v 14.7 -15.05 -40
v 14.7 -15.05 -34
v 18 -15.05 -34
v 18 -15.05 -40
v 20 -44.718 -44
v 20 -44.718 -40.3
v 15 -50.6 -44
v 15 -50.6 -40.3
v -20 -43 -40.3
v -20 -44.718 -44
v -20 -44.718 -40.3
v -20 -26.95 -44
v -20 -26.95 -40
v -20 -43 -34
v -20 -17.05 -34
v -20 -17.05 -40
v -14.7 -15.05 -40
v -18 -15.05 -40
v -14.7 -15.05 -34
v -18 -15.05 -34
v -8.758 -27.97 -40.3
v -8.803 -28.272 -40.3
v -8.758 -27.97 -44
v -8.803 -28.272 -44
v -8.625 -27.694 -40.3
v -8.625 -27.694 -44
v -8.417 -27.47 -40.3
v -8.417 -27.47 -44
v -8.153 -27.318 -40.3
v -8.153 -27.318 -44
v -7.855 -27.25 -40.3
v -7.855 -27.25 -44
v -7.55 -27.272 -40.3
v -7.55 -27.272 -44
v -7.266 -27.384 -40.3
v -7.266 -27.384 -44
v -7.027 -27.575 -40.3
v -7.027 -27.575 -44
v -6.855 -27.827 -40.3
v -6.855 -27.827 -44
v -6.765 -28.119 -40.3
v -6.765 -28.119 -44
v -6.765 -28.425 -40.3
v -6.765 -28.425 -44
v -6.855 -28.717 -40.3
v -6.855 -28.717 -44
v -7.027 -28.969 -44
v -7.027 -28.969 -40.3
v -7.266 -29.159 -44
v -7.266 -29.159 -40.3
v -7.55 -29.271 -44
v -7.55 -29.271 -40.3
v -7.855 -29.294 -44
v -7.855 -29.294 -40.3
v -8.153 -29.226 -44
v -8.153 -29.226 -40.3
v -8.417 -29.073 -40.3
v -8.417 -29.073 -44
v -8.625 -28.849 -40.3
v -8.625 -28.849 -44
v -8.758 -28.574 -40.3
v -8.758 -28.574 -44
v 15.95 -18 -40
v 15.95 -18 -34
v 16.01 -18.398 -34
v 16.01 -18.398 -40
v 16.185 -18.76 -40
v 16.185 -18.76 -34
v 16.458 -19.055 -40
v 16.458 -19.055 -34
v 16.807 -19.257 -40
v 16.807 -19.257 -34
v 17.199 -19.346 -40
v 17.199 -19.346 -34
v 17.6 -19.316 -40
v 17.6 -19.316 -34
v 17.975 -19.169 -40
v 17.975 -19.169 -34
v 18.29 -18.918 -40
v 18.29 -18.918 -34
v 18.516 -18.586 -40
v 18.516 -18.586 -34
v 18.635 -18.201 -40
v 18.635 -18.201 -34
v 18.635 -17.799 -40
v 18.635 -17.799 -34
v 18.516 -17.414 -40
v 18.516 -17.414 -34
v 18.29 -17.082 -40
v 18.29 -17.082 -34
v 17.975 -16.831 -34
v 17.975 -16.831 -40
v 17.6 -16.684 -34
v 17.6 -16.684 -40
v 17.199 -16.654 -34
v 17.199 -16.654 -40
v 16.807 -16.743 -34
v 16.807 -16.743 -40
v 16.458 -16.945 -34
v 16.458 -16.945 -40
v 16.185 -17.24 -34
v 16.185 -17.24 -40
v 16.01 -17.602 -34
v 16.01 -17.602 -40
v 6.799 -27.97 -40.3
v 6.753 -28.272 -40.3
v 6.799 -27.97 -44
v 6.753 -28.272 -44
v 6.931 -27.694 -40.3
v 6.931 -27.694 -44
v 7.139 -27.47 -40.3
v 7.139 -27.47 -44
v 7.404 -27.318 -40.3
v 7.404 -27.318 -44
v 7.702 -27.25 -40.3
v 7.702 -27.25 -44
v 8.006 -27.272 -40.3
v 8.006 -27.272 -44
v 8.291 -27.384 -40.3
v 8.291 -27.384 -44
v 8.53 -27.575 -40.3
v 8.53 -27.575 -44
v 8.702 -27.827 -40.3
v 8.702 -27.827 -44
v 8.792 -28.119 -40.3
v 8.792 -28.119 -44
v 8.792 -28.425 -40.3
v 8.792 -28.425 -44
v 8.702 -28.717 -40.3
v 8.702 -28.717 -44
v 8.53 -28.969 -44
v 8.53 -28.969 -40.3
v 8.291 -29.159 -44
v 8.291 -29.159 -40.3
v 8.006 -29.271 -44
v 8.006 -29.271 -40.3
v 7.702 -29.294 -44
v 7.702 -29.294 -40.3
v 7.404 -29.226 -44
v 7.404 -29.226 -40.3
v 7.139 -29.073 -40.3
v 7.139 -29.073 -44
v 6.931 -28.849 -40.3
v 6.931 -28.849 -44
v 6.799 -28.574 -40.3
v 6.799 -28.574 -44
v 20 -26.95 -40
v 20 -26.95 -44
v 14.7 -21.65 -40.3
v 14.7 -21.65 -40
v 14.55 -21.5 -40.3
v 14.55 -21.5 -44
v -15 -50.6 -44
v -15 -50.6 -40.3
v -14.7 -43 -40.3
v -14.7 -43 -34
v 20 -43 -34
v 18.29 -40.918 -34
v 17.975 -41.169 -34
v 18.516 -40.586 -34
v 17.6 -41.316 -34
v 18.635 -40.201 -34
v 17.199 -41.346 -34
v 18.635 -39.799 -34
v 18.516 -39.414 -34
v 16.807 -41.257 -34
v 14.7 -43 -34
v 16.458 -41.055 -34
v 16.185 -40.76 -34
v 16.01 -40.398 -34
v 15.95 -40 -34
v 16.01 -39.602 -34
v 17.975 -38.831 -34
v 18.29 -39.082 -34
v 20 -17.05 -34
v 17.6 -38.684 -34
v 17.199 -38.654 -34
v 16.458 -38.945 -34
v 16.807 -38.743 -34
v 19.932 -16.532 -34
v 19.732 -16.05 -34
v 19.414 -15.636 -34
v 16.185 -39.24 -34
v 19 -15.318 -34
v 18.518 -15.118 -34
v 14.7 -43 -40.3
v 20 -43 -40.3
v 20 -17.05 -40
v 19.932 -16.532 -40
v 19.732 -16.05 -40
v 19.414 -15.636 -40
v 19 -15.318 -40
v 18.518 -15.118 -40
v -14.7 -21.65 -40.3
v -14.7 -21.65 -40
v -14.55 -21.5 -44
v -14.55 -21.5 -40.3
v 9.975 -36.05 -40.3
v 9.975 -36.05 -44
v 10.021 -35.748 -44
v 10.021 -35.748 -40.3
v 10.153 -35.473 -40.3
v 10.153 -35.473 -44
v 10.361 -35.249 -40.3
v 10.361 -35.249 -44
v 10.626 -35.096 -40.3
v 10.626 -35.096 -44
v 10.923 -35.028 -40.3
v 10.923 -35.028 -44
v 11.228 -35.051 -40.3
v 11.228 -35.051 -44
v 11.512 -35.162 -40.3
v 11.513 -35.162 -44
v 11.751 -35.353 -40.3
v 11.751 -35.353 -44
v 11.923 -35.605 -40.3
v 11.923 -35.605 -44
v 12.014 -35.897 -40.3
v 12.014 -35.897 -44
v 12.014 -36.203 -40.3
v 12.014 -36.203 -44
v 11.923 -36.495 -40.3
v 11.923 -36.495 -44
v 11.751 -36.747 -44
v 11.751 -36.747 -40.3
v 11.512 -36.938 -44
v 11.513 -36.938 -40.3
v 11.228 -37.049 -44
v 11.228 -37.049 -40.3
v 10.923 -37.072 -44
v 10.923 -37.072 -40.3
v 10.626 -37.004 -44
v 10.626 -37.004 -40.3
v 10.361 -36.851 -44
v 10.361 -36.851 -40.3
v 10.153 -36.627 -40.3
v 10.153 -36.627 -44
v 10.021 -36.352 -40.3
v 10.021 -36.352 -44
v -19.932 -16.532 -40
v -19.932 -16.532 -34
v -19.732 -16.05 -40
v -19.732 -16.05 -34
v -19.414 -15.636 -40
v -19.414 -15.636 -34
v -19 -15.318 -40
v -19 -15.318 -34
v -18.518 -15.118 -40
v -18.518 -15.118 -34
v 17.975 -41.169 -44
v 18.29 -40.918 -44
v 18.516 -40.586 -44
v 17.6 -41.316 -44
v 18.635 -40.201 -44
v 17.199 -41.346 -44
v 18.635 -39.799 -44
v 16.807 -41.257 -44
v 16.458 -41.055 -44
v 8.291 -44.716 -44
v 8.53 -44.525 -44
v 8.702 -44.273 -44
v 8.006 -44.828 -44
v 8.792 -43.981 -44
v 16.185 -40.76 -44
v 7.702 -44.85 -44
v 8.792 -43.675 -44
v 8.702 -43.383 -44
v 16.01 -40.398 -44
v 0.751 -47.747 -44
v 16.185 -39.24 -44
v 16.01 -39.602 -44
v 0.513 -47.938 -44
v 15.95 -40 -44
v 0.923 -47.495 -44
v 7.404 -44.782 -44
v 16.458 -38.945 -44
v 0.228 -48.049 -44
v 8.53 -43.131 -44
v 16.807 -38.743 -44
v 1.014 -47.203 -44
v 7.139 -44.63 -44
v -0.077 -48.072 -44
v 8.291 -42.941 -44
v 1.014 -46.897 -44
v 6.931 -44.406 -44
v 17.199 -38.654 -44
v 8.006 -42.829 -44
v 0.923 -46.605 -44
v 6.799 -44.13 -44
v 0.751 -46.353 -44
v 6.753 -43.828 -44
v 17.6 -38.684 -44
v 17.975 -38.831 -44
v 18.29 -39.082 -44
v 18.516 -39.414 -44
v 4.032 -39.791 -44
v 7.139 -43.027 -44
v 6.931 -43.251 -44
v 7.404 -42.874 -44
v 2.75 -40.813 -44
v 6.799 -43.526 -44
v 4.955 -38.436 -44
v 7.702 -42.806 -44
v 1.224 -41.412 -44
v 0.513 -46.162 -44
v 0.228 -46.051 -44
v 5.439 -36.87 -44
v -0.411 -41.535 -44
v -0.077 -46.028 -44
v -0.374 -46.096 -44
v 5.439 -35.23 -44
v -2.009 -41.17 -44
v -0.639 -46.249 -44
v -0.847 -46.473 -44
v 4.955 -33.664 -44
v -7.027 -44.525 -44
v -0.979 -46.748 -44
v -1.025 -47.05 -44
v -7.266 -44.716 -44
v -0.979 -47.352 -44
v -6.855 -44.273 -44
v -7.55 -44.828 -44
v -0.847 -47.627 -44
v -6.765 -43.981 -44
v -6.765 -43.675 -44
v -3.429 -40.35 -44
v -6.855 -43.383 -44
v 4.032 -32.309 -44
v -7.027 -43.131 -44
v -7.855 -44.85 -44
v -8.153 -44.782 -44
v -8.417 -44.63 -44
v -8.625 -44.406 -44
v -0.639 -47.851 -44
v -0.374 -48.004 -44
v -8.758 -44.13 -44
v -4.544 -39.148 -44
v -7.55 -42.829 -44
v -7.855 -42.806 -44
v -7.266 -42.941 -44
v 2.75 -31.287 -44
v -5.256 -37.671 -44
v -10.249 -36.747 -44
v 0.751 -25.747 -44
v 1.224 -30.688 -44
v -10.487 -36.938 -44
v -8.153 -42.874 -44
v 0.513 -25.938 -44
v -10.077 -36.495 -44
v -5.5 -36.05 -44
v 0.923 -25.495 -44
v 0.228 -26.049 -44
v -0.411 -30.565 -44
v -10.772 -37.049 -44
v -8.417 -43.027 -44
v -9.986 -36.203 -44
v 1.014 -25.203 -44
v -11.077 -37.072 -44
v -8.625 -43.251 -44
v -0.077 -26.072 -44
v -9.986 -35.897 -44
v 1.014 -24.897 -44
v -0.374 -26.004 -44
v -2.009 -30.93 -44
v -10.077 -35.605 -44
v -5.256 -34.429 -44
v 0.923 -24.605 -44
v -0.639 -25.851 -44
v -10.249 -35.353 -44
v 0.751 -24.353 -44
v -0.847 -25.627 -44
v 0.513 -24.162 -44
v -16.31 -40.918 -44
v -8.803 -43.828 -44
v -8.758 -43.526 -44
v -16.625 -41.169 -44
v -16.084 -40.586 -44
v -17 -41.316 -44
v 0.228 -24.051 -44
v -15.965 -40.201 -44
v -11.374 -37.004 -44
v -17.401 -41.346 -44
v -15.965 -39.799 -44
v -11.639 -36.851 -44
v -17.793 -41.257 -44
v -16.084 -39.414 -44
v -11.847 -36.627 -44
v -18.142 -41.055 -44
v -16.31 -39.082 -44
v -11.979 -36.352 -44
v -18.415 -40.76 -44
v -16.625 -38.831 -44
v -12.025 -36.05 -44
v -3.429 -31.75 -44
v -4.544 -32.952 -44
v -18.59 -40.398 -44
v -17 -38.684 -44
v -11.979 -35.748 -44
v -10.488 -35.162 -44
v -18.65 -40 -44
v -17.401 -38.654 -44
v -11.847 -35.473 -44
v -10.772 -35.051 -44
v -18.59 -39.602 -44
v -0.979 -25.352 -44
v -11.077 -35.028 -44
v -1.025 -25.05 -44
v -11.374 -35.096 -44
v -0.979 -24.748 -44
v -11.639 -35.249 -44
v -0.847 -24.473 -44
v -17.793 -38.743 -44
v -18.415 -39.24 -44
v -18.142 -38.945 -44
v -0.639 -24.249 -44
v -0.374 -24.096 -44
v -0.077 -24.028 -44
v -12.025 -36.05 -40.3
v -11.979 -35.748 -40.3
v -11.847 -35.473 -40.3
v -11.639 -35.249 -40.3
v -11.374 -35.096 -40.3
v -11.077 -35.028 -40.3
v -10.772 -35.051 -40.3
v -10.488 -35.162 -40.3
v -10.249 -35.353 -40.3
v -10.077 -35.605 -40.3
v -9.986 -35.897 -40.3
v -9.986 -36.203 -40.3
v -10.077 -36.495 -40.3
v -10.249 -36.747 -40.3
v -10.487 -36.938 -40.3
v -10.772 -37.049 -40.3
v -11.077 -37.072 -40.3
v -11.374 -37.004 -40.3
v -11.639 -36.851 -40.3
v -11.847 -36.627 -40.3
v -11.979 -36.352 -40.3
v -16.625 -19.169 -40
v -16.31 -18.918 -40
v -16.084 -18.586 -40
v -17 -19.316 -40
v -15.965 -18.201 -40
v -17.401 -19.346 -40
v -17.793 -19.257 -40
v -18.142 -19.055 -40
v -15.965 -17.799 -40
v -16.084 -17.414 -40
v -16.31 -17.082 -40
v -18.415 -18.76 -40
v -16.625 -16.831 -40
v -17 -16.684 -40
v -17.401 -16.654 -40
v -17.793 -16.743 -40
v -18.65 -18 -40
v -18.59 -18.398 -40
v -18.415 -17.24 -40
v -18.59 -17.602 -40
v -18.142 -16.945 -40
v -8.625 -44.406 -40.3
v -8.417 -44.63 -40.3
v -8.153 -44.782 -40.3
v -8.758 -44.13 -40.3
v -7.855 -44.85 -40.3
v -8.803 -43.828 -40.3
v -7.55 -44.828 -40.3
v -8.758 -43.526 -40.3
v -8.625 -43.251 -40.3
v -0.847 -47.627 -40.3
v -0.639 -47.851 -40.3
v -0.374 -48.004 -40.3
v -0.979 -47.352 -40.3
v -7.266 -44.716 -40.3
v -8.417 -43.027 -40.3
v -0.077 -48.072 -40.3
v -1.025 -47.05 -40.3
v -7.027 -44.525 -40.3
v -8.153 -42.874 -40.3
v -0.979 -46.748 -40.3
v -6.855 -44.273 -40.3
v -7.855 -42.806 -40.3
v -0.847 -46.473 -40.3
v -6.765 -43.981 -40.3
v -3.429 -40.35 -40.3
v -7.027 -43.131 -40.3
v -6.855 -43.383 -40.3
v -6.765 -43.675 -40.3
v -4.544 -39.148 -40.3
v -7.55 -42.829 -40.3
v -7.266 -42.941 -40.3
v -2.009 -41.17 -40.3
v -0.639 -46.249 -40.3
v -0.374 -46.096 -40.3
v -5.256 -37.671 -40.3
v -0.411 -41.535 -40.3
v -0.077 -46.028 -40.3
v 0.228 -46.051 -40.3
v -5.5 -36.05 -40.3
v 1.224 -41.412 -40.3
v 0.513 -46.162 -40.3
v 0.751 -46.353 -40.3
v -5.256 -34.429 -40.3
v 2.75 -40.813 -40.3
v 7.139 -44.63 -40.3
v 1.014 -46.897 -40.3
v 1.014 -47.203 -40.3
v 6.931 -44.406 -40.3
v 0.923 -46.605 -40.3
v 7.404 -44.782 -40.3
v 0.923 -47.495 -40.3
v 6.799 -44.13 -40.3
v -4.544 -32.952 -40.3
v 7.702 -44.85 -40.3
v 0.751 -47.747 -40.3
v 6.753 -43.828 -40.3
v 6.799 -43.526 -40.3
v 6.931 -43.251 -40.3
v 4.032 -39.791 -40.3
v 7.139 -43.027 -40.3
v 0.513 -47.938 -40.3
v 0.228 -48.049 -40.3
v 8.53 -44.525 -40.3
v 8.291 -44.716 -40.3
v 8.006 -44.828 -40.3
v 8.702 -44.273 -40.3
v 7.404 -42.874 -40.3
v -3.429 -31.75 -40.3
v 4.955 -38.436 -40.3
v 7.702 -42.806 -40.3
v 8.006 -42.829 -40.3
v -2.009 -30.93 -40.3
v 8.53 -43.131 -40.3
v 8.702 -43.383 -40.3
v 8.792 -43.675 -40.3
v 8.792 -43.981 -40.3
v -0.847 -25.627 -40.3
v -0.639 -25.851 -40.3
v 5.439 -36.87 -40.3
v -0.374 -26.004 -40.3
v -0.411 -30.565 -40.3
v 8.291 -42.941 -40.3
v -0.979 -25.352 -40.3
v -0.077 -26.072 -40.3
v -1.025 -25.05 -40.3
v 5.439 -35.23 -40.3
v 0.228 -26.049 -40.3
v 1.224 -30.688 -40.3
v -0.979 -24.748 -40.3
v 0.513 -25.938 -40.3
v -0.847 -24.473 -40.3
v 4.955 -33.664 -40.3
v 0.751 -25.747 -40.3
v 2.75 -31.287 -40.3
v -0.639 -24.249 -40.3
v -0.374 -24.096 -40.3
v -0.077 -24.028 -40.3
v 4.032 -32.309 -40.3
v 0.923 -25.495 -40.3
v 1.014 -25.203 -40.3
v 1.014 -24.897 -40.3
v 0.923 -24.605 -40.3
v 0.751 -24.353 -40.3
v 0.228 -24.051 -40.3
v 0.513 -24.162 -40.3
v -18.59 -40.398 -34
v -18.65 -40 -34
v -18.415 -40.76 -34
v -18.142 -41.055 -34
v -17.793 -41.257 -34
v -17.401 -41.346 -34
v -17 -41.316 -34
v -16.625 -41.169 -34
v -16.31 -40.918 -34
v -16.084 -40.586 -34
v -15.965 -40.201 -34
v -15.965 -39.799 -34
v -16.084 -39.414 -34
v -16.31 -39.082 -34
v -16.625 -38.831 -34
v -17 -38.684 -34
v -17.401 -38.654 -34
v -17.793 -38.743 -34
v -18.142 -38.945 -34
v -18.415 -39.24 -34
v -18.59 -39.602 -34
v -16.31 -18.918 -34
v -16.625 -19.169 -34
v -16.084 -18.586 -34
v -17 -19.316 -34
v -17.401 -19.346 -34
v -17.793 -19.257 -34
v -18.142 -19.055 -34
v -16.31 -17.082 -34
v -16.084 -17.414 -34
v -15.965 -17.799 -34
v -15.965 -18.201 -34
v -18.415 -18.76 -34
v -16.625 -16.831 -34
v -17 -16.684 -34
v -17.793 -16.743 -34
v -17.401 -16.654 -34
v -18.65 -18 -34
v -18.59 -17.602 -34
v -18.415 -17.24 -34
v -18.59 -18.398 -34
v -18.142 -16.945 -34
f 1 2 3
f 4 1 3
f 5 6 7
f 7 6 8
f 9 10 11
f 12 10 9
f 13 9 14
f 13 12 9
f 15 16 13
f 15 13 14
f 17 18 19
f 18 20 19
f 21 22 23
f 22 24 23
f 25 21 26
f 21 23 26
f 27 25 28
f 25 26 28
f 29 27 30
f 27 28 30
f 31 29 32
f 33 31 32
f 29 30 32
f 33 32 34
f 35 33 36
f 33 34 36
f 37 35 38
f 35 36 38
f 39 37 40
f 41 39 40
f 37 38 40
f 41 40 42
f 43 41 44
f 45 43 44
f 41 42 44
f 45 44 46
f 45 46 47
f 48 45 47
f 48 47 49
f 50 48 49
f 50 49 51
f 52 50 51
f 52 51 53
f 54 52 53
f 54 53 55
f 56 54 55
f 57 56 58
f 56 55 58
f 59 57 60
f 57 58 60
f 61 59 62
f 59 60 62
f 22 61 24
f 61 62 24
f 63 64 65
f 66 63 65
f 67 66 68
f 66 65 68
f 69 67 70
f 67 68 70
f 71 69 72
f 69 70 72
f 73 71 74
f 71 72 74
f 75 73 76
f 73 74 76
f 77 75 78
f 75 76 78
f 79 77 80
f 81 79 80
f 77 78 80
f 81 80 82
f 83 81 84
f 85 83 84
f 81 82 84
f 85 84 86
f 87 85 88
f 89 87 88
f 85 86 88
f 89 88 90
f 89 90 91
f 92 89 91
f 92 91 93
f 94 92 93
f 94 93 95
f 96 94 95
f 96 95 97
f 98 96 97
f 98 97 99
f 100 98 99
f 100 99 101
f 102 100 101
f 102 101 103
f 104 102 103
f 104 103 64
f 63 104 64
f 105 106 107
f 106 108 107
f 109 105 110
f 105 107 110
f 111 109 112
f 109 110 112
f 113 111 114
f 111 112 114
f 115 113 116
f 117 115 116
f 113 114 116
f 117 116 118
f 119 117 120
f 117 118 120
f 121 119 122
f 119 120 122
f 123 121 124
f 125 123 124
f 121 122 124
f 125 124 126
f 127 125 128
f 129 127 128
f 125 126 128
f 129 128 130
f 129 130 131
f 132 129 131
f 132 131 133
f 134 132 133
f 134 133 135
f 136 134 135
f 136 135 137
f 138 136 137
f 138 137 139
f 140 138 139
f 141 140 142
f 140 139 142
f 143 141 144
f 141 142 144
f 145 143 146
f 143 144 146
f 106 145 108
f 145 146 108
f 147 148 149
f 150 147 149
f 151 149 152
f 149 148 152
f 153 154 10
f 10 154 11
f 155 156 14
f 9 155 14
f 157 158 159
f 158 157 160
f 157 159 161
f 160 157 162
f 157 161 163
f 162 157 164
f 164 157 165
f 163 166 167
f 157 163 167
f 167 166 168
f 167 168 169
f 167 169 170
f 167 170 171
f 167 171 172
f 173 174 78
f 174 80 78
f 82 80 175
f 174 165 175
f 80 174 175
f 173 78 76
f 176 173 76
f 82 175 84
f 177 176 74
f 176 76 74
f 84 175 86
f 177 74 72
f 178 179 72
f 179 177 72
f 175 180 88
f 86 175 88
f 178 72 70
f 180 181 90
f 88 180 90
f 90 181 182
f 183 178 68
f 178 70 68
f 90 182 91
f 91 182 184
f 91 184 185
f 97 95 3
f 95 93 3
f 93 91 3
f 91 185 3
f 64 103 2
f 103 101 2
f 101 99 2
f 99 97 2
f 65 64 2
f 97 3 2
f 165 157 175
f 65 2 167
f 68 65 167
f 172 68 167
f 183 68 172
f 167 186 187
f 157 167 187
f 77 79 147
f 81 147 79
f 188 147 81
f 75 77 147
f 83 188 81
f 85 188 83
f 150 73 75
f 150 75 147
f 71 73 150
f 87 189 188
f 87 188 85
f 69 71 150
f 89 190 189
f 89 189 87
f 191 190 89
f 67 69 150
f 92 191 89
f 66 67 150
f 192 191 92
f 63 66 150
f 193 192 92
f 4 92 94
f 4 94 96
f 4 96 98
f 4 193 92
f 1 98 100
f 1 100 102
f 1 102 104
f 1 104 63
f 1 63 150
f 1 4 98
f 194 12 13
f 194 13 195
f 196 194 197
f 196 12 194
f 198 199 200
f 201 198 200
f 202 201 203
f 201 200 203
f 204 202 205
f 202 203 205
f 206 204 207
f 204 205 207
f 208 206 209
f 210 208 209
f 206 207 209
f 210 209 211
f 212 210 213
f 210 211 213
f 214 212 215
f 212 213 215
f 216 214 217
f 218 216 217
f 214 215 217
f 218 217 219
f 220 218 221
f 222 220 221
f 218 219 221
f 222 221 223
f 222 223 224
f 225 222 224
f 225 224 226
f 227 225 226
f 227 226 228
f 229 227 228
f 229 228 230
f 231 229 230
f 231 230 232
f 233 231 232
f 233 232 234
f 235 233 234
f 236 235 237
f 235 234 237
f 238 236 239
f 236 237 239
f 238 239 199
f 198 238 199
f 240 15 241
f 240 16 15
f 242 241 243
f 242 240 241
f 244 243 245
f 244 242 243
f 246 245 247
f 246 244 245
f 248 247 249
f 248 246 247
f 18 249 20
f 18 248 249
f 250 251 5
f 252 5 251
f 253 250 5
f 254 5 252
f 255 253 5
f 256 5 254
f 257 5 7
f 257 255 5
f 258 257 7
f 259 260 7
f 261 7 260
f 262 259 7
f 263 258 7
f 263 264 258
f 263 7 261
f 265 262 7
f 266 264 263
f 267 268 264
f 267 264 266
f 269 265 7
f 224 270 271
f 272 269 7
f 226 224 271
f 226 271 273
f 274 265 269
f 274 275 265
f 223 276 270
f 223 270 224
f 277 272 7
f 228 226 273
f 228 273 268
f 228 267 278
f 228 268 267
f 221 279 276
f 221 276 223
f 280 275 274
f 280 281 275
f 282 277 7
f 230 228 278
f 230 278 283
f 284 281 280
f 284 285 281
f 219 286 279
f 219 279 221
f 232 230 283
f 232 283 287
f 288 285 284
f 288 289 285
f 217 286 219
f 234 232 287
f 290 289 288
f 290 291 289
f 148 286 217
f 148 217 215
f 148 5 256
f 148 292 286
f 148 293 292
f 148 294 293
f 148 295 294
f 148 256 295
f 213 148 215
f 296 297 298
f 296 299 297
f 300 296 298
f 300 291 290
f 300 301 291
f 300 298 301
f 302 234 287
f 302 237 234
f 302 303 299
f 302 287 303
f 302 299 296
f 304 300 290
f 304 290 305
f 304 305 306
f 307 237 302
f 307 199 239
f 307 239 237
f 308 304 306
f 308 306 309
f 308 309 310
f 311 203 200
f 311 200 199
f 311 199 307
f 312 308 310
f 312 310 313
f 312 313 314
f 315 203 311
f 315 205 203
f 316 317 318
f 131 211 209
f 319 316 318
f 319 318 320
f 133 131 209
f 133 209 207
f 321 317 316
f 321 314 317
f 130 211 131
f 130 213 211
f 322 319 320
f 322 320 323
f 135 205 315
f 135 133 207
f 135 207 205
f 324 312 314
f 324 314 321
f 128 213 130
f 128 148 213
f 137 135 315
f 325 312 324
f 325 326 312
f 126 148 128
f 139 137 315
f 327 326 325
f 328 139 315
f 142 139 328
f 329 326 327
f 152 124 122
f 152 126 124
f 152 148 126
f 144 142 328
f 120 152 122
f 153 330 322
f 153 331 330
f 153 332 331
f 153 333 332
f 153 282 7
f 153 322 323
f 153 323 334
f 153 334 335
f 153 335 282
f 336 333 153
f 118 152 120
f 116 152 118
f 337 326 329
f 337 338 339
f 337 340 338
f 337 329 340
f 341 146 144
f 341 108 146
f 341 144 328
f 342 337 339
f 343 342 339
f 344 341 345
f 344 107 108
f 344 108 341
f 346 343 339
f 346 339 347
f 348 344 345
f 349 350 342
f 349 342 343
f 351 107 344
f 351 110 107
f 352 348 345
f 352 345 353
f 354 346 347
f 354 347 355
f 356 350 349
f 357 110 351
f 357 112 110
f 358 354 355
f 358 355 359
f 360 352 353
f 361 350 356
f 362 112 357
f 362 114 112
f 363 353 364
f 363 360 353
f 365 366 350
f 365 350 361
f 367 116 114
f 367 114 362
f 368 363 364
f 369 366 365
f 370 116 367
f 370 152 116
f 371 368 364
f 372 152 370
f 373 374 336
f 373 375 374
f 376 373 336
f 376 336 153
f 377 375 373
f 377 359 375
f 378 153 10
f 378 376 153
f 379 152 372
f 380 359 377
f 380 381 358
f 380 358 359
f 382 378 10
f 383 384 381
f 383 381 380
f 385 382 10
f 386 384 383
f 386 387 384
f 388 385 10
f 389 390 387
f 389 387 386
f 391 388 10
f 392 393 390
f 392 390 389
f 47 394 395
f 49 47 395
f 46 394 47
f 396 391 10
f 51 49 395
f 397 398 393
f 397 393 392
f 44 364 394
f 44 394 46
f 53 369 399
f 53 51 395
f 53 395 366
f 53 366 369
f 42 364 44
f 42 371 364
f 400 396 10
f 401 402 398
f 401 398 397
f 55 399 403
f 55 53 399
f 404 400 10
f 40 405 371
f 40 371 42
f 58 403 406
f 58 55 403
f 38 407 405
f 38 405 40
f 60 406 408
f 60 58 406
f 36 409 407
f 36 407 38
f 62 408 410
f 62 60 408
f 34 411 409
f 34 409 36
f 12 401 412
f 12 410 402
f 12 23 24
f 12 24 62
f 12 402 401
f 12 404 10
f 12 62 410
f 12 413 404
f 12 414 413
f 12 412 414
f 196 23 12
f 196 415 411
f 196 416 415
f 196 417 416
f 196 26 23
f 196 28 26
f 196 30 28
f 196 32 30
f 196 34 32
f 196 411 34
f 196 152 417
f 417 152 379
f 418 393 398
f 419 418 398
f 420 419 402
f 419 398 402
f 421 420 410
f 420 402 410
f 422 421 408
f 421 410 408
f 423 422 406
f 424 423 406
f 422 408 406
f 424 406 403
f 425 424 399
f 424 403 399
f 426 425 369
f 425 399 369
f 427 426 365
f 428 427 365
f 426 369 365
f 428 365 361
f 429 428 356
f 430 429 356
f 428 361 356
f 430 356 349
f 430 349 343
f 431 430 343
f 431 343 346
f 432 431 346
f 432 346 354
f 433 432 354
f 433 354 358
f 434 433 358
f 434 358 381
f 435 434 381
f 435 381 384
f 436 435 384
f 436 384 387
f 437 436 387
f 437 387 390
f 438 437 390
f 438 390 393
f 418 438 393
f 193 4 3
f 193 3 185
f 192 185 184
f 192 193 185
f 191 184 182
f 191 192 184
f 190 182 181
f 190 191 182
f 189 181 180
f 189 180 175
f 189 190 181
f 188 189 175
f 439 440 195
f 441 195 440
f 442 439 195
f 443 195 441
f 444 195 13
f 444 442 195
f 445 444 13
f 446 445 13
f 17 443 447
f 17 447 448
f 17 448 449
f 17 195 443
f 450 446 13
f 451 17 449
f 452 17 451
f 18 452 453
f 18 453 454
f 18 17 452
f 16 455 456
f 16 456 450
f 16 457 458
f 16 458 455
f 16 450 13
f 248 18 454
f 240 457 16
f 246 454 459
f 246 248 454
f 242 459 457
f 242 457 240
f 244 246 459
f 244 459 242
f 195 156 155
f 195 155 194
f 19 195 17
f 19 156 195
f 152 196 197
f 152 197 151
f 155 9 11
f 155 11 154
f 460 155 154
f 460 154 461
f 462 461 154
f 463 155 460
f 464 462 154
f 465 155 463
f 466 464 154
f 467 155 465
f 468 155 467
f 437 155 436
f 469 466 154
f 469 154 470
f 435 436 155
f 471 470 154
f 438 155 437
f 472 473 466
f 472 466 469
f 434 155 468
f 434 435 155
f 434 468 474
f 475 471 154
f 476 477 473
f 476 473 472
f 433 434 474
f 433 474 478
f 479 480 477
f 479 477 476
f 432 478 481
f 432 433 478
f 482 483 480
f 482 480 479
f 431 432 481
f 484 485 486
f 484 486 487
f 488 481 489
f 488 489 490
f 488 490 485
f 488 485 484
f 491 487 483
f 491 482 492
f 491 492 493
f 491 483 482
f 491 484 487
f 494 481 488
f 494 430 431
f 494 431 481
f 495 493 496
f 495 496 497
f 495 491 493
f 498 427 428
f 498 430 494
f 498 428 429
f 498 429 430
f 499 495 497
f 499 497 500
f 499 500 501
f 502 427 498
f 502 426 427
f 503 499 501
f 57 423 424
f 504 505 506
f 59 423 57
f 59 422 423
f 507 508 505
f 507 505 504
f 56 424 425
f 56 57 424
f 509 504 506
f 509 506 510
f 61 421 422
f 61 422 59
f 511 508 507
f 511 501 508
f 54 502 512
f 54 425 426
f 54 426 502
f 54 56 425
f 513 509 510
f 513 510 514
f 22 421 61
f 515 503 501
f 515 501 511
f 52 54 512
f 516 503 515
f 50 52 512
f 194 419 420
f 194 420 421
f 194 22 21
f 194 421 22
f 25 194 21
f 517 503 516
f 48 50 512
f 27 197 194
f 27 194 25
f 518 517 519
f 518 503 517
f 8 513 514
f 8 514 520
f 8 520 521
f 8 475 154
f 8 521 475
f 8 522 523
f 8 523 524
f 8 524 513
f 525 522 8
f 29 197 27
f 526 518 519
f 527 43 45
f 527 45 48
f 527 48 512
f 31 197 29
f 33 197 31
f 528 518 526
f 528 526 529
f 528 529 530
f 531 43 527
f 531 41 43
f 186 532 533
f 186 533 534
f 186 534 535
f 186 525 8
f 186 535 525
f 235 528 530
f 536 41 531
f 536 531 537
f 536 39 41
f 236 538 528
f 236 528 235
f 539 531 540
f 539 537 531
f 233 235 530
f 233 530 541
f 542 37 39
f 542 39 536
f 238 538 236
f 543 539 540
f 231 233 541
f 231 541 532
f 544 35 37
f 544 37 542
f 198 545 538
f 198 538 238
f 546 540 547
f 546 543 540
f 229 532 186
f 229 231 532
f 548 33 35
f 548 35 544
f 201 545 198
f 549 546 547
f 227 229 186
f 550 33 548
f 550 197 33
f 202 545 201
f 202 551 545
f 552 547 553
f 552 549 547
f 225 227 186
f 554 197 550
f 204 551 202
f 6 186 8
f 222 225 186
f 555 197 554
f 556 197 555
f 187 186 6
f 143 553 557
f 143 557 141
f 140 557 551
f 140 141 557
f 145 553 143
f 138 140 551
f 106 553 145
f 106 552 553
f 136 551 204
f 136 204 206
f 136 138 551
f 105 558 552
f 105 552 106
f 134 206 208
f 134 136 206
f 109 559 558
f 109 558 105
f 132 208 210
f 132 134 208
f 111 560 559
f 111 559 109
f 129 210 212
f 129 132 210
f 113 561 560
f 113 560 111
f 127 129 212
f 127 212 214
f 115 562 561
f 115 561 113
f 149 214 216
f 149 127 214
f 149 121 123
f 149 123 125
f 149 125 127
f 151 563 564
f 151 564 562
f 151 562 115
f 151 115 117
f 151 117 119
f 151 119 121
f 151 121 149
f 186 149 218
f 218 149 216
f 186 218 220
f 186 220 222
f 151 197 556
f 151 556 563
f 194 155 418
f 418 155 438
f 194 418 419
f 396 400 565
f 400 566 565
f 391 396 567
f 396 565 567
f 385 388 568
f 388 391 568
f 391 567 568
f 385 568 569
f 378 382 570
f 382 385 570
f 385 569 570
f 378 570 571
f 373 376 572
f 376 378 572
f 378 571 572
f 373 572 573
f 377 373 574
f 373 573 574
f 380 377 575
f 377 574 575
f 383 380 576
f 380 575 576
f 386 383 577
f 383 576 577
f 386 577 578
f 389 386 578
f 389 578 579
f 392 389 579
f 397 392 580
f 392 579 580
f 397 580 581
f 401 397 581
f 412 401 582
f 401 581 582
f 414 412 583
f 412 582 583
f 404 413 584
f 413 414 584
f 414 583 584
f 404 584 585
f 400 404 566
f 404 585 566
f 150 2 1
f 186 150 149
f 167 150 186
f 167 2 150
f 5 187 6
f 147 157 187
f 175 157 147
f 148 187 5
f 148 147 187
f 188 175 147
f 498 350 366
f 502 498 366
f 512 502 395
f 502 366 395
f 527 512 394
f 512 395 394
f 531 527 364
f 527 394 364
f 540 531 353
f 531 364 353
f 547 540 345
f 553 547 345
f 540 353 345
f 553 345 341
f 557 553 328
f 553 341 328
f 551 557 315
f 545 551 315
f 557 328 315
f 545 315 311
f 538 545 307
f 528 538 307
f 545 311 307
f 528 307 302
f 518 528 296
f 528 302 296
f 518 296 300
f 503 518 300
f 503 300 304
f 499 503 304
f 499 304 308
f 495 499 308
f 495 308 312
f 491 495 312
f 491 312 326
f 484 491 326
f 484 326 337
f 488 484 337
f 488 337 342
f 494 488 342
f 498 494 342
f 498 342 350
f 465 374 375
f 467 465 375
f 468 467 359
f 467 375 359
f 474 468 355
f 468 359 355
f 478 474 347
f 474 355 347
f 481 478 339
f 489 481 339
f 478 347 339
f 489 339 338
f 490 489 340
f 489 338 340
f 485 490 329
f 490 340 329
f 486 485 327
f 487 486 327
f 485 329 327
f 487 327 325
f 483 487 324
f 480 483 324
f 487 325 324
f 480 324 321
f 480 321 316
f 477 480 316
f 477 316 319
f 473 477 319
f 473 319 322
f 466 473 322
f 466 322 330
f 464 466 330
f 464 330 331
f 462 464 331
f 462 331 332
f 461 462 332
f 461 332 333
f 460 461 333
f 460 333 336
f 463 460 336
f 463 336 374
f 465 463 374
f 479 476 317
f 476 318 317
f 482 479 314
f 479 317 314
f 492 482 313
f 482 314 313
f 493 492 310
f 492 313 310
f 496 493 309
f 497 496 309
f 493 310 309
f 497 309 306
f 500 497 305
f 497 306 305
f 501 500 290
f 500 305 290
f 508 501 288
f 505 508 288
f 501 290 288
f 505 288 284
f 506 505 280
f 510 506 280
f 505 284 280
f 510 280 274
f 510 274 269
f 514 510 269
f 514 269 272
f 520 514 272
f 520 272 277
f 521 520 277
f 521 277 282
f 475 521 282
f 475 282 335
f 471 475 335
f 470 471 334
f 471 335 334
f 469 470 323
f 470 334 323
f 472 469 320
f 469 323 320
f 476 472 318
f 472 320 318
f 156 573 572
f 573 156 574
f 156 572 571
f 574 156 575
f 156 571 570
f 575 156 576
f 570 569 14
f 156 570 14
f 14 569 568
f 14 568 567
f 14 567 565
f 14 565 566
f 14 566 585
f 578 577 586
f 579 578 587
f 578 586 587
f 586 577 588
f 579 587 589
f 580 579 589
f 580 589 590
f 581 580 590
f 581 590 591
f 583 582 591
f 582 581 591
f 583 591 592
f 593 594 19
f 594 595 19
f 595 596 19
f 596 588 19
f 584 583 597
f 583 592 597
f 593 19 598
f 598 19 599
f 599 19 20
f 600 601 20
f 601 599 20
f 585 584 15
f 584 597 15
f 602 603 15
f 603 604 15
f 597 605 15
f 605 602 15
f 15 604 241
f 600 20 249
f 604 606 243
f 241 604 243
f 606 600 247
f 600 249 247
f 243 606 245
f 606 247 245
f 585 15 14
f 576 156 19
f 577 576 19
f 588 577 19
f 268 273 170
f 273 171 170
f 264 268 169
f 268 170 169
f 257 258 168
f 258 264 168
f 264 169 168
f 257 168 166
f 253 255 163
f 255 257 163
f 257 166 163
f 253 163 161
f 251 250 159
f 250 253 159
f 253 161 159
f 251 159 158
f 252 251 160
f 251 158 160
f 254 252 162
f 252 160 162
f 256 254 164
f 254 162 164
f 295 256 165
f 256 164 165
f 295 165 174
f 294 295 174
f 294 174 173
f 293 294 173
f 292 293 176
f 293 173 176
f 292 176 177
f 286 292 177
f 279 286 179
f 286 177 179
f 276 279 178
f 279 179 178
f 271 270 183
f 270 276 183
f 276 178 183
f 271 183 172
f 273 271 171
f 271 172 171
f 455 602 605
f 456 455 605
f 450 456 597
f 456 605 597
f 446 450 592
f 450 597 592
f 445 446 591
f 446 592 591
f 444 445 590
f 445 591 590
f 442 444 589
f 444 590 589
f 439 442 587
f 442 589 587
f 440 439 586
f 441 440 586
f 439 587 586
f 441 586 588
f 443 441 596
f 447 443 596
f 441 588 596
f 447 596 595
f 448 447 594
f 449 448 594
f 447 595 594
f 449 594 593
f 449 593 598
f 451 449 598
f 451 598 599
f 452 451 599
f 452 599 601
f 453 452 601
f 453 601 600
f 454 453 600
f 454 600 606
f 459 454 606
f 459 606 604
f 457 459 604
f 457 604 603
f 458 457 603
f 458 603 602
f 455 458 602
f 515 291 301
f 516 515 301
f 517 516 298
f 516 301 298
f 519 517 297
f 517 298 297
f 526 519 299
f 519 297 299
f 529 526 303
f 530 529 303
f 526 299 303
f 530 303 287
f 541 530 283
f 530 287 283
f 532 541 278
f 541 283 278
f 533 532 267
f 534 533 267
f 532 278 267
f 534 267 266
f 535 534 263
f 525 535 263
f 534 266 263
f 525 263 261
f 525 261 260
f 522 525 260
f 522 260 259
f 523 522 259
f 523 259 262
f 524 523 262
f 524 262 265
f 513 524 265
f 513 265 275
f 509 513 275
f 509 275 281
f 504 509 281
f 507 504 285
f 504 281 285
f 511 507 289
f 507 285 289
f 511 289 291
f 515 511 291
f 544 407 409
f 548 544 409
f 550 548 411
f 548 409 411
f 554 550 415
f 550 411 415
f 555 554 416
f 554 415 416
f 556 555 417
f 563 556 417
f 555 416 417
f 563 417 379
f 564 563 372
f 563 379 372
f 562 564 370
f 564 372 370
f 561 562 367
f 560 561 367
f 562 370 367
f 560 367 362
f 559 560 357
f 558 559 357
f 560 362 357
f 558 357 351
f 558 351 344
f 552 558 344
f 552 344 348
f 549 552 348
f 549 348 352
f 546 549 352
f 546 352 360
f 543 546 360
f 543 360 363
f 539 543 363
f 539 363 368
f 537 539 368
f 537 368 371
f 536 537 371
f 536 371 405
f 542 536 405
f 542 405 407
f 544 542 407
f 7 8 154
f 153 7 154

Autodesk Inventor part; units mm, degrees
ref_plane "YZ Plane" through (0, 0, 0) normal (1, 0, 0) x (0, 1, 0)
ref_plane "Work Plane1" through (0, 0, -34) normal (0, 0, -1) x (-1, 0, 0)
sketch "Sketch1" plane through (0, 0, -34) normal (0, 0, -1) x (-1, 0, 0)
  line L0 (-15, 14.5) -> (-11.5, 14.5) projected
  line L1 (-15, 14.5) -> (-20.1, 8.5) projected
  line L2 (-20.1, 8.5) -> (-20.1, -44.6) projected
  line L3 (-20.1, -44.6) -> (-15, -50.6) projected
  line L4 (-15, -50.6) -> (15, -50.6) projected
  line L5 (15, -50.6) -> (20.1, -44.6) projected
  line L6 (20.1, -44.6) -> (20.1, 8.5) projected
  line L7 (20.1, 8.5) -> (15, 14.5) projected
  line L8 (11.5, 14.5) -> (15, 14.5) projected
  arc A0 (14.5, 11.5) -> (11.5, 14.5) centre (11.5, 11.5) ccw projected
  line L9 (14.5, -42) -> (14.5, 11.5) projected
  arc A1 (11.5, -45) -> (14.5, -42) centre (11.5, -42) ccw projected
  line L10 (-11.5, -45) -> (11.5, -45) projected
  arc A2 (-14.5, -42) -> (-11.5, -45) centre (-11.5, -42) ccw projected
  line L11 (-14.5, 11.5) -> (-14.5, -42) projected
  arc A3 (-11.5, 14.5) -> (-14.5, 11.5) centre (-11.5, 11.5) ccw projected
  circle A4 centre (17.3, 4) radius 1.35 projected
  circle A5 centre (17.3, -18) radius 1.35 projected
  circle A6 centre (17.3, -40) radius 1.35 projected
  circle A7 centre (11, -47.8) radius 1.35 projected
  circle A8 centre (-17.3, 4) radius 1.35 projected
  circle A9 centre (-17.3, -18) radius 1.35 projected
  circle A10 centre (-17.3, -40) radius 1.35 projected
  circle A11 centre (-11, -47.8) radius 1.35 projected
  line L12 (-20.1, -18.05) -> (-20.1, -15.05)
  line L13 (-20.1, -18.05) -> (-17.1, -18.05) construction
  line L14 (-20.1, -18.05) -> (-20.1, -44.6)
  line L15 (-20.1, -44.6) -> (-15, -50.6)
  line L16 (-15, -50.6) -> (15, -50.6)
  line L17 (15, -50.6) -> (20.1, -44.6)
  line L18 (20.1, -44.6) -> (20.1, -18.05)
  line L19 (20.1, -18.05) -> (20.1, -15.05)
  line L20 (20.1, -18.05) -> (23.1, -18.05) construction
  line L21 (20.1, -15.05) -> (-20.1, -15.05)
  point P0 (0, 0)
  dimension "d0" = 3
  dimension "d1" = 90
  dimension "d2" = 3
  dimension "d3" = 90
ref_plane "Work Plane2" through (-19.4786, -19.4786, -43.1) normal (0, 0, -1) x (-0.6619, 0.7496, 0)
extrude "Extrusion1" add sketch "Sketch1" along normal blind 10 contours L21 L11 A2 L10 A1 L9 L6 L5 L4 L3 L2 | L21 L9 A1 L10 A2 L11 | A7 | A11
sketch "Sketch2" plane through (0, 0, -34) normal (0, 0, 1) x (1, 0, 0)
  line L0 (15, 14.5) -> (11.5, 14.5) projected
  line L1 (15, 14.5) -> (20.1, 8.5) projected
  line L2 (20.1, 8.5) -> (20.1, -44.6) projected
  line L3 (20.1, -44.6) -> (15, -50.6) projected
  line L4 (15, -50.6) -> (-15, -50.6) projected
  line L5 (-15, -50.6) -> (-20.1, -44.6) projected
  line L6 (-20.1, -44.6) -> (-20.1, 8.5) projected
  line L7 (-20.1, 8.5) -> (-15, 14.5) projected
  line L8 (-11.5, 14.5) -> (-15, 14.5) projected
  arc A0 (-11.5, 14.5) -> (-14.5, 11.5) centre (-11.5, 11.5) ccw projected
  line L9 (-14.5, -42) -> (-14.5, 11.5) projected
  arc A1 (-14.5, -42) -> (-11.5, -45) centre (-11.5, -42) ccw projected
  line L10 (11.5, -45) -> (-11.5, -45) projected
  arc A2 (11.5, -45) -> (14.5, -42) centre (11.5, -42) ccw projected
  line L11 (14.5, 11.5) -> (14.5, -42) projected
  arc A3 (14.5, 11.5) -> (11.5, 14.5) centre (11.5, 11.5) ccw projected
  circle A4 centre (-17.3, 4) radius 1.35 projected
  circle A5 centre (-17.3, -18) radius 1.35 projected
  circle A6 centre (-17.3, -40) radius 1.35 projected
  circle A7 centre (-11, -47.8) radius 1.35 projected
  circle A8 centre (17.3, 4) radius 1.35 projected
  circle A9 centre (17.3, -18) radius 1.35 projected
  circle A10 centre (17.3, -40) radius 1.35 projected
  circle A11 centre (11, -47.8) radius 1.35 projected
  line L12 (-20.1, -15.05) -> (20.1, -15.05) projected
  line L13 (14.5, -15.05) -> (14.7, -15.05)
  line L14 (14.7, -15.05) -> (14.7, -40)
  line L15 (14.7, -15.05) -> (39.65, -15.05) construction
  line L16 (14.7, -40) -> (14.7, -43)
  line L17 (14.7, -43) -> (-14.7, -43)
  line L18 (-14.7, -43) -> (-14.7, -15.05)
  line L19 (-14.7, -15.05) -> (14.7, -15.05)
  line L20 (14.7, -15.05) -> (14.7, -43)
  point P0 (0, 0)
  dimension "d6" = 0.2
  dimension "d8" = 90
  dimension "d9" = 3
  dimension "d10" = 29.4
  dimension "d11" = 27.95
extrude "Extrusion2" cut sketch "Sketch2" against normal blind 6.3 contours L12 L14 L16 L17 A2 L11 | L11 A2 L17 A1 L9 L12 | L9 A1 L17 L18 L12
sketch "Sketch4" plane through (0, 0, -34) normal (0, 0, 1) x (1, 0, 0)
  line L0 (-14.7, -43) -> (-14.7, -15.05) projected
  line L1 (-14.7, -43) -> (-20.1, -43)
  line L2 (-20.1, -44.6) -> (-20.1, -15.05) projected
  line L3 (-20.1, -43) -> (20.1, -43)
  line L4 (20.1, -43) -> (20.1, -50.6)
  line L5 (20.1, -50.6) -> (-20.1, -50.6)
  line L6 (-20.1, -50.6) -> (-20.1, -43)
  point P0 (0, 0)
  dimension "d14" = 7.6
  dimension "d15" = 40.2
extrude "Extrusion3" cut sketch "Sketch4" against normal blind 6.3
sketch "Sketch5" plane through (0, 0, -44) normal (0, 0, -1) x (-1, 0, 0)
  line L0 (-20.1, -15.05) -> (-20.1, -44.6) projected
  line L1 (-20.1, -15.05) -> (-20.1, -36.05)
  line L2 (-20.1, -15.05) -> (0.9, -15.05) construction
  line L3 (-20.1, -36.05) -> (0, -36.05)
  line L4 (-20.1, -36.05) -> (0, -36.05) construction
  circle A0 centre (0, -36.05) radius 5.5
  line L5 (0, -36.05) -> (0, -47.05)
  line L6 (0, -36.05) -> (11, -36.05) construction
  circle A1 centre (0, -47.05) radius 1.025
  circle A2 centre (7.7782, -43.8282) radius 1.025
  circle A3 centre (11, -36.05) radius 1.025
  circle A4 centre (7.7782, -28.2718) radius 1.025
  circle A5 centre (0, -25.05) radius 1.025
  circle A6 centre (-7.7782, -28.2718) radius 1.025
  circle A7 centre (-11, -36.05) radius 1.025
  circle A8 centre (-7.7782, -43.8282) radius 1.025
  point P0 (0, 0)
  dimension "d18" = 21
  dimension "d19" = 90
  dimension "d23" = 20.1
  dimension "d24" = 0
  dimension "d25" = 11
  dimension "d26" = 11
  dimension "d27" = 90
  dimension "d28" = 2.05
  dimension "d31" = 360
extrude "Extrusion4" cut sketch "Sketch5" against normal up to surface (3.7 mm away)
sketch "Sketch7" plane through (0, 0, -44) normal (0, 0, -1) x (-1, 0, 0)
  circle A0 centre (-7.7782, -43.8282) radius 1.025 construction
  circle A1 centre (0, -36.05) radius 5.5 construction
  circle A2 centre (-11, -36.05) radius 1.025 construction
  circle A3 centre (0, -25.05) radius 1.025 construction
  circle A4 centre (11, -36.05) radius 1.025 construction
  circle A5 centre (0, -47.05) radius 1.025 construction
  circle A6 centre (7.7782, -43.8282) radius 1.025 construction
  circle A7 centre (7.7782, -28.2718) radius 1.025 construction
  circle A8 centre (-7.7782, -28.2718) radius 1.025 construction
  circle A9 centre (-17.3, -40) radius 1.35 construction
  circle A10 centre (-17.3, -18) radius 1.35 construction
  circle A11 centre (17.3, -40) radius 1.35 construction
  circle A12 centre (17.3, -18) radius 1.35 construction
  line L0 (-20.1, -44.6) -> (-15, -50.6) construction
  line L1 (-15, -50.6) -> (15, -50.6) construction
  line L2 (15, -50.6) -> (20.1, -44.6) construction
  line L3 (20.1, -44.6) -> (20.1, -15.05) construction
  line L4 (20.1, -15.05) -> (-20.1, -15.05) construction
  line L5 (-20.1, -15.05) -> (-20.1, -44.6) construction
  line L6 (-20.1, -15.05) -> (-20.1, -27.05)
  line L7 (-20.1, -15.05) -> (-20.1, -44.6) construction
  line L8 (-20.1, -15.05) -> (-8.1, -15.05)
  line L9 (0, -15.05) -> (0, -21.5) construction
  line L10 (0, -21.5) -> (20.1, -21.5) construction
  line L11 (0, -21.5) -> (20.1, -21.5) construction
  line L12 (0, -21.5) -> (-20.1, -21.5) construction
  line L13 (0, -21.5) -> (20.1, -21.5) construction
  line L14 (-20.1, -27.05) -> (-14.55, -21.5)
  line L15 (-20.1, -27.05) -> (-12.2511, -27.05) construction
  line L16 (0, -15.05) -> (20.1, -15.05)
  line L17 (20.1, -15.05) -> (20.1, -27.05)
  line L18 (20.1, -27.05) -> (14.55, -21.5)
  line L19 (14.55, -21.5) -> (-14.55, -21.5)
  line L20 (-14.7, -15.05) -> (-20.1, -15.05) projected
  line L21 (-20.1, -15.05) -> (20.1, -15.05)
  point P0 (0, 0)
  dimension "d40" = 12
  dimension "d41" = 90
  dimension "d42" = 6.45
  dimension "d43" = 20.1
  dimension "d44" = 0
  dimension "d45" = 20.1
  dimension "d46" = 180
  dimension "d47" = 45
  dimension "d48" = 12
  dimension "d49" = 90
  dimension "d50" = 45
extrude "Extrusion5" cut sketch "Sketch7" against normal blind 4
sketch "Sketch10" plane through (20.1, -44.6, -40.3) normal (1, 0, 0) x (0, 0, -1)
  line L0 (3.7, 17.55) -> (-0.3, 17.55) construction
  line L1 (-0.3, 17.55) -> (-0.3, 29.55) construction
  line L2 (-6.3, 29.55) -> (-0.3, 29.55) construction
  line L3 (-6.3, 29.55) -> (-6.3, 1.6) construction
  line L4 (-6.3, 1.6) -> (0, 1.6) construction
  line L5 (0, 1.6) -> (0, 0) construction
  line L6 (0, 0) -> (3.7, 0) construction
  line L7 (3.7, 17.55) -> (3.7, 0) construction
  line L8 (0, 0) -> (0, -6) construction
  line L9 (0, -6) -> (3.7, -6) construction
  line L10 (3.7, 0) -> (3.7, -6) construction
  line L11 (0, 0) -> (3.7, 0) construction
  line L12 (-6.3, 29.55) -> (-0.3, 29.55) projected
  line L13 (-6.3, 29.55) -> (3.7, 29.55)
  line L14 (3.7, 29.55) -> (3.7, -6)
  line L15 (3.7, -6) -> (-6.3, -6)
  line L16 (-6.3, -6) -> (-6.3, 29.55)
  point P0 (-40.3, 44.6)
sketch "Sketch12" plane through (-20.1, -44.6, -44) normal (-1, 0, 0) x (0, 0, 1)
  line L0 (4, 17.55) -> (0, 17.55) construction
  line L1 (0, 0) -> (0, 17.55) construction
  line L2 (3.7, 0) -> (0, 0) construction
  line L3 (3.7, 0) -> (3.7, 1.6) construction
  line L4 (3.7, 1.6) -> (10, 1.6) construction
  line L5 (10, 1.6) -> (10, 29.55) construction
  line L6 (10, 29.55) -> (4, 29.55) construction
  line L7 (4, 29.55) -> (4, 17.55) construction
  line L8 (3.7, -6) -> (3.7, 0) construction
  line L9 (3.7, 0) -> (0, 0) construction
  line L10 (0, -6) -> (0, 0) construction
  line L11 (3.7, -6) -> (0, -6) construction
  line L12 (10, 29.55) -> (4, 29.55) projected
  line L13 (3.7, -6) -> (0, -6) projected
  line L14 (10, 29.55) -> (0, 29.55)
  line L15 (0, 29.55) -> (0, -6)
  line L16 (0, -6) -> (10, -6)
  line L17 (10, -6) -> (10, 29.55)
  point P0 (44, 44.6)
extrude "Extrusion8" cut sketch "Sketch10" against normal blind 0.1
extrude "Extrusion9" cut sketch "Sketch12" against normal blind 0.1
fillet "Fillet2" radius 2 2 edges at (-20, -15.05, -37) (20, -15.05, -37)
properties part number "knee_connector_new"
